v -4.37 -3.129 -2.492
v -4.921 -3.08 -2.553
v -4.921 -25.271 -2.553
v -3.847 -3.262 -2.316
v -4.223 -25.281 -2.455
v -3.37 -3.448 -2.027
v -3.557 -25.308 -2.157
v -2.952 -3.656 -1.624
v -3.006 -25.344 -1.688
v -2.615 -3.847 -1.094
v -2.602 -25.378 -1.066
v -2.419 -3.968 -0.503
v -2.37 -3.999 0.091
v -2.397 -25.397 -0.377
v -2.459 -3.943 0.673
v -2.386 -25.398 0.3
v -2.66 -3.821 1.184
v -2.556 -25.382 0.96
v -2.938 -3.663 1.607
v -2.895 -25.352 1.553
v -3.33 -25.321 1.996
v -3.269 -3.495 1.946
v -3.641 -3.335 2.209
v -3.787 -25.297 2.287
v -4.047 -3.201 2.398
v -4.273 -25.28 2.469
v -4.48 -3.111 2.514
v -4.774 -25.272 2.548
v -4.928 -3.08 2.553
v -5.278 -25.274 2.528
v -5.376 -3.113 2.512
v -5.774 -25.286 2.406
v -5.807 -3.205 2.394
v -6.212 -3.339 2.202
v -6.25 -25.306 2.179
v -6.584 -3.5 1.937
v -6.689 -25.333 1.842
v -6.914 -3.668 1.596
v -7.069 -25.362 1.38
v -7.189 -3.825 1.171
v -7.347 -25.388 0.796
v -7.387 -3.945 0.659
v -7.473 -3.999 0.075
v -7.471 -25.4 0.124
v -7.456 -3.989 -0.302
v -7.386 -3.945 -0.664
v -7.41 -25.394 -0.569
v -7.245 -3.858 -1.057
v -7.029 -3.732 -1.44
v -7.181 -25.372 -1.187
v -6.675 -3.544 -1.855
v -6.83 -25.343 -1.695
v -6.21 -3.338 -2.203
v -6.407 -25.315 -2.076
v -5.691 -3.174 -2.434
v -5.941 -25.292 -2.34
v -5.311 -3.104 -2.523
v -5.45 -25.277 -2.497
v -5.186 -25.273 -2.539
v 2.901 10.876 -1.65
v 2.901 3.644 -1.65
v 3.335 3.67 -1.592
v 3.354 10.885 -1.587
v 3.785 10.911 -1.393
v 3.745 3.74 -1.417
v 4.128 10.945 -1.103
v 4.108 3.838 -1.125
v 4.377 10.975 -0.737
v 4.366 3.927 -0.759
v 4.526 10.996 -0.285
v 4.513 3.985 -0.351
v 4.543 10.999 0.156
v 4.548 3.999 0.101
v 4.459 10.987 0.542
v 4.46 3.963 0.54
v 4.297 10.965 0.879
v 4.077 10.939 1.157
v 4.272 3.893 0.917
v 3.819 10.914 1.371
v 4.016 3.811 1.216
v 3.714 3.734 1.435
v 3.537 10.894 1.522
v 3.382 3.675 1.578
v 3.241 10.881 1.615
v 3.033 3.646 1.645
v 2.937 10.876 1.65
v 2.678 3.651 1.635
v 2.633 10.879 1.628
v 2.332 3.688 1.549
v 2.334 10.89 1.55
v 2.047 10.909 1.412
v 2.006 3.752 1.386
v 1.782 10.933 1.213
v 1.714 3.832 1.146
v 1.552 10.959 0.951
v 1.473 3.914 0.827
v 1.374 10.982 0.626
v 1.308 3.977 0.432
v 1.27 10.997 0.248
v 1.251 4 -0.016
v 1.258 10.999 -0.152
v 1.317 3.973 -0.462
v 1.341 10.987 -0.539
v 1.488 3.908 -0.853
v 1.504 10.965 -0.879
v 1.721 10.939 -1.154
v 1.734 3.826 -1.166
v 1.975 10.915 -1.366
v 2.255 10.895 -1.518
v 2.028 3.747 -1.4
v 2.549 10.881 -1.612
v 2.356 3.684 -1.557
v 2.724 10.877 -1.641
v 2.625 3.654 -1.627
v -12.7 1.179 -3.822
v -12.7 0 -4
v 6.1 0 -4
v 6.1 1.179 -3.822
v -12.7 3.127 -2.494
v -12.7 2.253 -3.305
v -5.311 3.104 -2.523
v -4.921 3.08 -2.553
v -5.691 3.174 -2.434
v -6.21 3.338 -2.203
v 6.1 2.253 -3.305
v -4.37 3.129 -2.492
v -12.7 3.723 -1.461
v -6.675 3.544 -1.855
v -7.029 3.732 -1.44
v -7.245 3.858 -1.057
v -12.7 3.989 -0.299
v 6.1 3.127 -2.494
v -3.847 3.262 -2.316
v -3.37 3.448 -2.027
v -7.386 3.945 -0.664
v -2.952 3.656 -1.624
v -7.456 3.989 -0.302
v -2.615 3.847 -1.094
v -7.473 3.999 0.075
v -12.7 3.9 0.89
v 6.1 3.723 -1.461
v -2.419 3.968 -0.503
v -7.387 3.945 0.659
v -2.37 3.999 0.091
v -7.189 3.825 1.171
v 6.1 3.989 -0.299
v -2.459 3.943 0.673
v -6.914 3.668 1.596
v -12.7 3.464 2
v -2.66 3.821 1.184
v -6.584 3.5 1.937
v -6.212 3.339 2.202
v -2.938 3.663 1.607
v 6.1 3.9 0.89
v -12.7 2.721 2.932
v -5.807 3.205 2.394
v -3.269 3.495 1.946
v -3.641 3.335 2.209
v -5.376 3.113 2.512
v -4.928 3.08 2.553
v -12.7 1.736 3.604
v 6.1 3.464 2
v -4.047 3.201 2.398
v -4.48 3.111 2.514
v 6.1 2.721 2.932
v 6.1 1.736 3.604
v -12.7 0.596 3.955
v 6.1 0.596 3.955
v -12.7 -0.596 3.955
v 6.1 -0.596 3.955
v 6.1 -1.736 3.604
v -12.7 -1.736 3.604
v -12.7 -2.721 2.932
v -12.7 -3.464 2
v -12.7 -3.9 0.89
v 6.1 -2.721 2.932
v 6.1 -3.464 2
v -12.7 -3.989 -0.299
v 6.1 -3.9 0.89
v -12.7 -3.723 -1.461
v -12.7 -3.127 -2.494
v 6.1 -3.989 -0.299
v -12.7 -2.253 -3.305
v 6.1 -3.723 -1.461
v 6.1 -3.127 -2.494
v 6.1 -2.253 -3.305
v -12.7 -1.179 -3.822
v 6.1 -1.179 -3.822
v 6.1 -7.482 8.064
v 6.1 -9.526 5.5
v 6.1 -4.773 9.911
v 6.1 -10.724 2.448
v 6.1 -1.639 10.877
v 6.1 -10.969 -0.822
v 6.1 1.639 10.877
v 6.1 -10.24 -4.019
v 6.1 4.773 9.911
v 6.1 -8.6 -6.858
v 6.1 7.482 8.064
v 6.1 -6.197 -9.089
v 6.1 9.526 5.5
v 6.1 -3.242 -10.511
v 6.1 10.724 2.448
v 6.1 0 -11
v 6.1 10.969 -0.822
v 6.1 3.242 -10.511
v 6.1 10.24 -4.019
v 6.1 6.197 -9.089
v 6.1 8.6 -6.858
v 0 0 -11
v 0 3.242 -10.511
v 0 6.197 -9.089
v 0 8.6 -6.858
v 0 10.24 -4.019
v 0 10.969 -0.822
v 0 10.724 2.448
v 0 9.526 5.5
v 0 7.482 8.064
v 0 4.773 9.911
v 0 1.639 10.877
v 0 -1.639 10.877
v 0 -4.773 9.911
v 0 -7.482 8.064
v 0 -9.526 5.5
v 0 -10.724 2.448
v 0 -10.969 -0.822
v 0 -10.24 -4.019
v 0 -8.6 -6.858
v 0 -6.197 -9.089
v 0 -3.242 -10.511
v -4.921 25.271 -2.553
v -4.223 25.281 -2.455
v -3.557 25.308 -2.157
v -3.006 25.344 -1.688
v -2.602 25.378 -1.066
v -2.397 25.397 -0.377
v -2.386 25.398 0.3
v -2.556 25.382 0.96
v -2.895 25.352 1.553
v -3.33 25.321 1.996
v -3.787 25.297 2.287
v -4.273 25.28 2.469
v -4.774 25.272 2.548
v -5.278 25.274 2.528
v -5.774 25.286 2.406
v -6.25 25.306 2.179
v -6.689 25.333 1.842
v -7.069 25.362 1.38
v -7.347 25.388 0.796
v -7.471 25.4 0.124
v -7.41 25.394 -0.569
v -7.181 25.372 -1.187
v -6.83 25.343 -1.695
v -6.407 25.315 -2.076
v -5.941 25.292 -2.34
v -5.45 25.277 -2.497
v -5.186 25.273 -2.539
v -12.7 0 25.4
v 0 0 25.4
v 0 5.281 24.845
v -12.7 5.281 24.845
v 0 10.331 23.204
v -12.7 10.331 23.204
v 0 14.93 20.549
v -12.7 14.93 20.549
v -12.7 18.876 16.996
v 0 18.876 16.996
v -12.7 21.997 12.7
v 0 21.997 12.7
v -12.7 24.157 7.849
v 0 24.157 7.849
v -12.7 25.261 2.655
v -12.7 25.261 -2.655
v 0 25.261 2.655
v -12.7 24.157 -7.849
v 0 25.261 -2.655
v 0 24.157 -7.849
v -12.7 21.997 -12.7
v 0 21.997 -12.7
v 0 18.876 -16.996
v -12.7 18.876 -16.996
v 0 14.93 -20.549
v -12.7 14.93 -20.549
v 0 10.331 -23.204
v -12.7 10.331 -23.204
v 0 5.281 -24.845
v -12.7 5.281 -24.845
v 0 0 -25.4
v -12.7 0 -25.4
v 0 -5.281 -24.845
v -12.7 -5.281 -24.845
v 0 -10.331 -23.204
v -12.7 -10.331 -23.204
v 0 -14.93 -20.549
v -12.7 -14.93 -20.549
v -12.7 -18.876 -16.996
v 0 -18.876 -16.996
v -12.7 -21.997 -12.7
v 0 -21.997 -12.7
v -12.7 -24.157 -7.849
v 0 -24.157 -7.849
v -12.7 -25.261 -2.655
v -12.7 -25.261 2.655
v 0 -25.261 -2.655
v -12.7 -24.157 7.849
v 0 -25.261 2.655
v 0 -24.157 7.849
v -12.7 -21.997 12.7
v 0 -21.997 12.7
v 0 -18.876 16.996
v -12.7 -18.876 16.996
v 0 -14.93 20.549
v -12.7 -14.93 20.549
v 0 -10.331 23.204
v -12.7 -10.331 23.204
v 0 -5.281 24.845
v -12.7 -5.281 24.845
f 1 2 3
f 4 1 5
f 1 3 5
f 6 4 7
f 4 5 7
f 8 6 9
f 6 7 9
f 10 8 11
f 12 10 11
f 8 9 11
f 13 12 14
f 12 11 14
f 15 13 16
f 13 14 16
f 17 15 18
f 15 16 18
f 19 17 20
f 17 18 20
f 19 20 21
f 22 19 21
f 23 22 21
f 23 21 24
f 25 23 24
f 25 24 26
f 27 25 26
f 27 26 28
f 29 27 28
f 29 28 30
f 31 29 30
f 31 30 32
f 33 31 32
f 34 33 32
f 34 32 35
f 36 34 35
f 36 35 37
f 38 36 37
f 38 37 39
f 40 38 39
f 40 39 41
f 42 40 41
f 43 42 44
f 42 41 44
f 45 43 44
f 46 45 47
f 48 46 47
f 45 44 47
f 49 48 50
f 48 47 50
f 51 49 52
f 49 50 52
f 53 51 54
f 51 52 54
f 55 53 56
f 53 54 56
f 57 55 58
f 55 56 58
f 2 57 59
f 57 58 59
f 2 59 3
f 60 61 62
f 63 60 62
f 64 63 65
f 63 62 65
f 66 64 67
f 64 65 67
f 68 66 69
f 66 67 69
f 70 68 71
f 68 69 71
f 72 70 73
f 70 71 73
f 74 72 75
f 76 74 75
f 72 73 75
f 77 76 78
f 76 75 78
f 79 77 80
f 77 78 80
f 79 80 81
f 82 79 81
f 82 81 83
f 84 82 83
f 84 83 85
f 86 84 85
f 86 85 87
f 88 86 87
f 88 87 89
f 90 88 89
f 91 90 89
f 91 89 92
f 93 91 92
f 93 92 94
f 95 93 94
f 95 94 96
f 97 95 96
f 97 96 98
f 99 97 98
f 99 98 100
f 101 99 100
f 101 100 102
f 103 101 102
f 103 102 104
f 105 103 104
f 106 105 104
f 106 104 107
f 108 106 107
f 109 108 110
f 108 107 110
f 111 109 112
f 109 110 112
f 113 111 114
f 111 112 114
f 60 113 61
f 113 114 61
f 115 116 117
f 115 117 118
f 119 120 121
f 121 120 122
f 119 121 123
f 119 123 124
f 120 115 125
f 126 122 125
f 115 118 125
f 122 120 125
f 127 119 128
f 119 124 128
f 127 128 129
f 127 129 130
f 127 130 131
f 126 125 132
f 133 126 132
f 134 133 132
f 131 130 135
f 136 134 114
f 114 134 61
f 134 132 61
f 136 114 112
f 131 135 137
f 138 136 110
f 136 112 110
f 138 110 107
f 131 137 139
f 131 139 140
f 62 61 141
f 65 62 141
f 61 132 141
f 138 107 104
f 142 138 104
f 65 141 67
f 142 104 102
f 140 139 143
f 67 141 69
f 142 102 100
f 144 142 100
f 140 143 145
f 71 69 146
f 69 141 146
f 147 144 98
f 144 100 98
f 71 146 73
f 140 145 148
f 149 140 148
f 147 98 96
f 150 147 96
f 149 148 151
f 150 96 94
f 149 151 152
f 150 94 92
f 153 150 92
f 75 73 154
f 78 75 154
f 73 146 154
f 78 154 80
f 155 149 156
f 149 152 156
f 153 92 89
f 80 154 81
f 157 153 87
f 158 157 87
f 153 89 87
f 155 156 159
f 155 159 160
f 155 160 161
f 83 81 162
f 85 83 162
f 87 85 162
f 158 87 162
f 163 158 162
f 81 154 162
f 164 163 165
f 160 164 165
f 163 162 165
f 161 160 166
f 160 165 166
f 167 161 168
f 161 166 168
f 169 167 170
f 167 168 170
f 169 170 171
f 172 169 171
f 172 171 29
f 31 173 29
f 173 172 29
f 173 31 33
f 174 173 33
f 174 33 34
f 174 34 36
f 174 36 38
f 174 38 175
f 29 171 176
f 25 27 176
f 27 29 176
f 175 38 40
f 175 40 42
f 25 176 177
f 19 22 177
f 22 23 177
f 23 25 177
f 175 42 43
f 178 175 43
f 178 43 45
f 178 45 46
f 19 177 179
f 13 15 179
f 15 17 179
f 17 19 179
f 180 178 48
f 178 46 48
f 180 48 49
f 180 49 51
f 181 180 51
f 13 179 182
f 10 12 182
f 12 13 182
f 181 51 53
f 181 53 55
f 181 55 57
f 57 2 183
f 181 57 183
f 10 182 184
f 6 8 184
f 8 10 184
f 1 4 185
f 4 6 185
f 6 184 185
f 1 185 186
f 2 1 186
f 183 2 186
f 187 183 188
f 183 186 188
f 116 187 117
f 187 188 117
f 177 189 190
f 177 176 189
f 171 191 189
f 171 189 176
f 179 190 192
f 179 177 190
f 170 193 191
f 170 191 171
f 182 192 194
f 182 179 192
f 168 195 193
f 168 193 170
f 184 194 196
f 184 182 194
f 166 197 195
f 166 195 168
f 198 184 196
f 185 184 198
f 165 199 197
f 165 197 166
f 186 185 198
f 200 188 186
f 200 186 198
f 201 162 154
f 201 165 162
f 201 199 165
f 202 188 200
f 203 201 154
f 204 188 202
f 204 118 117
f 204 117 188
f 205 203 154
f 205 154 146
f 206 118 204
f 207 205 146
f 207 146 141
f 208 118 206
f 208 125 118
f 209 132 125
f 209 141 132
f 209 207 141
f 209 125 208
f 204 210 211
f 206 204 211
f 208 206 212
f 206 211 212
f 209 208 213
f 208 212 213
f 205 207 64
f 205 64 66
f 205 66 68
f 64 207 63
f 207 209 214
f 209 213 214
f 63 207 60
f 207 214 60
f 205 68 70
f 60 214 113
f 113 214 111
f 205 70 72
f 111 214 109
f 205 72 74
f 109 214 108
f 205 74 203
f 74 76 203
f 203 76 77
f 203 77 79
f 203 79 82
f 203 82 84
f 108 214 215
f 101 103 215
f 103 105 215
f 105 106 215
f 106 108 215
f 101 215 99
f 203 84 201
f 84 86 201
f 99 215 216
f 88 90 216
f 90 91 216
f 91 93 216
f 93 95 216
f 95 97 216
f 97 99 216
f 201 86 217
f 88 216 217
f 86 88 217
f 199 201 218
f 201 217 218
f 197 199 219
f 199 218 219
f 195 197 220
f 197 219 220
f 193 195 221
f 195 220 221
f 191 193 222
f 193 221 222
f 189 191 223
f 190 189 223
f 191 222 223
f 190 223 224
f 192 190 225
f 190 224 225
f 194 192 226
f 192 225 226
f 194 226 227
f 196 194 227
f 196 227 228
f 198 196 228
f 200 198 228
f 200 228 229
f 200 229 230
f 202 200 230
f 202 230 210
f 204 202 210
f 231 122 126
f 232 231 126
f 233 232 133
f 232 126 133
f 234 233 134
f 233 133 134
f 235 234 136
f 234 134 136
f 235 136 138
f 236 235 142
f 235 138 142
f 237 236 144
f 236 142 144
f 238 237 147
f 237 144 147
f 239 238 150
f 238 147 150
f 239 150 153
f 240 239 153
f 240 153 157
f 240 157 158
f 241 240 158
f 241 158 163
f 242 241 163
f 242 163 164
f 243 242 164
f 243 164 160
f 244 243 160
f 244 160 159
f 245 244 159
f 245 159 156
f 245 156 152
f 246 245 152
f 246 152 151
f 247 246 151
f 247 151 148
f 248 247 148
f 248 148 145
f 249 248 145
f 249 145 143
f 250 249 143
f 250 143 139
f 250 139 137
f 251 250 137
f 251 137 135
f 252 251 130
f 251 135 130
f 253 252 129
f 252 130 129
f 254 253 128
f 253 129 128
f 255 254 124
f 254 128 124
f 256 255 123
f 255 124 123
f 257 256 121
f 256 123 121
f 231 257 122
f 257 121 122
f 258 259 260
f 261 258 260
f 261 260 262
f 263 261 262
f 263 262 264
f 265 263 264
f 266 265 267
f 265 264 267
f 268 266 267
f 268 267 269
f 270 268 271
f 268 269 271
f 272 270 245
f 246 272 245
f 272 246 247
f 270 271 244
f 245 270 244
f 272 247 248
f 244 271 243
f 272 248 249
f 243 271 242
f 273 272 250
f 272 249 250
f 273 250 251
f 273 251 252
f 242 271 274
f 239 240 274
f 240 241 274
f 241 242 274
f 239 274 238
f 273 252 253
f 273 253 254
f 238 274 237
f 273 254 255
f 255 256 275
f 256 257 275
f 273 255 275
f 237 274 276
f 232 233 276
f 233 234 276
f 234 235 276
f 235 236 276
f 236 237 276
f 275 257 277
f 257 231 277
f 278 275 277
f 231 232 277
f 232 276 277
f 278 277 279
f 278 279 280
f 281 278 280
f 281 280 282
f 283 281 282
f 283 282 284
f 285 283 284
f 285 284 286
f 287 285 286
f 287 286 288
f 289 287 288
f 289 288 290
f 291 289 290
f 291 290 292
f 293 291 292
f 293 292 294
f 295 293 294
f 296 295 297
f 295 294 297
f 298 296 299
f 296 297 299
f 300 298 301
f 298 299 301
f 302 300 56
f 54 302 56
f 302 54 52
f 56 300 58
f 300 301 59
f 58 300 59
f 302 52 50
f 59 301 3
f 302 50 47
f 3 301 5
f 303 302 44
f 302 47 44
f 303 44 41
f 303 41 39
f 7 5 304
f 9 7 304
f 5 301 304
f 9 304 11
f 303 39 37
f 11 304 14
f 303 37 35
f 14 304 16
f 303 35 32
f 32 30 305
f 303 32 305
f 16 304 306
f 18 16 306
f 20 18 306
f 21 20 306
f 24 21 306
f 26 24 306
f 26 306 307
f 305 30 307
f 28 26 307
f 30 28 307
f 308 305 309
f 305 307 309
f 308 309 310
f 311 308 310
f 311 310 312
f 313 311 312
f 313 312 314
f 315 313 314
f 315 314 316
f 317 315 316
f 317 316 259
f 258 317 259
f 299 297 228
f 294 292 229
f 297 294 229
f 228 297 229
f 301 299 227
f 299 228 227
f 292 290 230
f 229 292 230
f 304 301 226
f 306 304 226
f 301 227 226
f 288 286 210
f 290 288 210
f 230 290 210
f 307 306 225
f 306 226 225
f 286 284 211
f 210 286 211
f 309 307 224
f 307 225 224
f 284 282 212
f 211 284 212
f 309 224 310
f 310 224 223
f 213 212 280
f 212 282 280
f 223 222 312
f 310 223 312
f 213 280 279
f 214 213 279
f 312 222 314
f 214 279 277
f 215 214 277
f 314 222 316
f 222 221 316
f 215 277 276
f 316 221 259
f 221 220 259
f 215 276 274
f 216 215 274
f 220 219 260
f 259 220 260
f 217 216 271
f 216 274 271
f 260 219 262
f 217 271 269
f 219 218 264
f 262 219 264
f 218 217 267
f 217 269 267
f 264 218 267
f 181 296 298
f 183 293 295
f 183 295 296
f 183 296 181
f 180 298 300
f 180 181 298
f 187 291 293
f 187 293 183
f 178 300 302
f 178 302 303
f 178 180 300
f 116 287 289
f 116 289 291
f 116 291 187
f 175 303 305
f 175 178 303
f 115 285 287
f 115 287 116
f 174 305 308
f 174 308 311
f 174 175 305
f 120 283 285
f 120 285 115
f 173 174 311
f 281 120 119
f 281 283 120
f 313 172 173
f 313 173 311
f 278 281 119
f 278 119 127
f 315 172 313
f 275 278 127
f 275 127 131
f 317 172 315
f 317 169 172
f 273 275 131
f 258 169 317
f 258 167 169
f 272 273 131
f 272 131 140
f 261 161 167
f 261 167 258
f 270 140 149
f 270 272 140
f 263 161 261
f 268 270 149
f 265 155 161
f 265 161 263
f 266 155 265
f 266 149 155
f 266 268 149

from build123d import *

# Parameters (mm, degrees)
SKETCH2_R                 = 11
BOSS_EXTRUDE2_DEPTH       = 6.1
SKETCH7_R                 = 4
CUT_EXTRUDE3_DEPTH        = 7.1
SKETCH8_R                 = 25.4
BOSS_EXTRUDE3_DEPTH       = 12.7
SKETCH10_R                = 4
CUT_EXTRUDE5_DEPTH        = 13.7
F_1_4_20_TAPPED_HOLE1_D   = 5.1054
M4X0_7_TAPPED_HOLE2_D     = 3.3
M4X0_7_TAPPED_HOLE2_DEPTH = 11.176
M4X0_7_TAPPED_HOLE2_TIP   = 0.991420021


with BuildPart() as part:
    # Sketch2 → Boss-Extrude2 (new body)
    with BuildSketch(Plane(origin=(0, 0, 0), x_dir=(0, 0, -1), z_dir=(1, 0, 0))):
        Circle(SKETCH2_R)
    extrude(amount=BOSS_EXTRUDE2_DEPTH)

    # Sketch7 → Cut-Extrude3 (cut, through all)
    with BuildSketch(Plane(origin=(6.1, 0, 0), x_dir=(0, 0, -1), z_dir=(1, 0, 0))):
        Circle(SKETCH7_R)
    extrude(amount=-CUT_EXTRUDE3_DEPTH, mode=Mode.SUBTRACT)

    # Sketch8 → Boss-Extrude3 (add)
    with BuildSketch(Plane.ZY):
        Circle(SKETCH8_R)
    extrude(amount=BOSS_EXTRUDE3_DEPTH)

    # Sketch10 → Cut-Extrude5 (cut, through all)
    with BuildSketch(Plane(origin=(0, 0, 0), x_dir=(0, 0, -1), z_dir=(1, 0, 0))):
        Circle(SKETCH10_R)
    extrude(amount=-CUT_EXTRUDE5_DEPTH, mode=Mode.SUBTRACT)

    # 1/4-20 Tapped Hole1 (through all)
    with Locations(Plane(origin=(-4.921208149, 25.4, 0), x_dir=(0, 0, 1), z_dir=(0, 1, 0))):
        with Locations((0, 0)):
            Hole(F_1_4_20_TAPPED_HOLE1_D / 2)

    # M4x0.7 Tapped Hole2
    with Locations(Plane(origin=(2.900798662, 11, 0), x_dir=(0, 0, 1), z_dir=(0, 1, 0))):
        with Locations((0, 0)):
            Hole(M4X0_7_TAPPED_HOLE2_D / 2, depth=M4X0_7_TAPPED_HOLE2_DEPTH)
            with Locations((0, 0, -(M4X0_7_TAPPED_HOLE2_DEPTH + M4X0_7_TAPPED_HOLE2_TIP / 2))):  # 118° drill point
                Cone(0, M4X0_7_TAPPED_HOLE2_D / 2, M4X0_7_TAPPED_HOLE2_TIP, mode=Mode.SUBTRACT)


solid = part.part
